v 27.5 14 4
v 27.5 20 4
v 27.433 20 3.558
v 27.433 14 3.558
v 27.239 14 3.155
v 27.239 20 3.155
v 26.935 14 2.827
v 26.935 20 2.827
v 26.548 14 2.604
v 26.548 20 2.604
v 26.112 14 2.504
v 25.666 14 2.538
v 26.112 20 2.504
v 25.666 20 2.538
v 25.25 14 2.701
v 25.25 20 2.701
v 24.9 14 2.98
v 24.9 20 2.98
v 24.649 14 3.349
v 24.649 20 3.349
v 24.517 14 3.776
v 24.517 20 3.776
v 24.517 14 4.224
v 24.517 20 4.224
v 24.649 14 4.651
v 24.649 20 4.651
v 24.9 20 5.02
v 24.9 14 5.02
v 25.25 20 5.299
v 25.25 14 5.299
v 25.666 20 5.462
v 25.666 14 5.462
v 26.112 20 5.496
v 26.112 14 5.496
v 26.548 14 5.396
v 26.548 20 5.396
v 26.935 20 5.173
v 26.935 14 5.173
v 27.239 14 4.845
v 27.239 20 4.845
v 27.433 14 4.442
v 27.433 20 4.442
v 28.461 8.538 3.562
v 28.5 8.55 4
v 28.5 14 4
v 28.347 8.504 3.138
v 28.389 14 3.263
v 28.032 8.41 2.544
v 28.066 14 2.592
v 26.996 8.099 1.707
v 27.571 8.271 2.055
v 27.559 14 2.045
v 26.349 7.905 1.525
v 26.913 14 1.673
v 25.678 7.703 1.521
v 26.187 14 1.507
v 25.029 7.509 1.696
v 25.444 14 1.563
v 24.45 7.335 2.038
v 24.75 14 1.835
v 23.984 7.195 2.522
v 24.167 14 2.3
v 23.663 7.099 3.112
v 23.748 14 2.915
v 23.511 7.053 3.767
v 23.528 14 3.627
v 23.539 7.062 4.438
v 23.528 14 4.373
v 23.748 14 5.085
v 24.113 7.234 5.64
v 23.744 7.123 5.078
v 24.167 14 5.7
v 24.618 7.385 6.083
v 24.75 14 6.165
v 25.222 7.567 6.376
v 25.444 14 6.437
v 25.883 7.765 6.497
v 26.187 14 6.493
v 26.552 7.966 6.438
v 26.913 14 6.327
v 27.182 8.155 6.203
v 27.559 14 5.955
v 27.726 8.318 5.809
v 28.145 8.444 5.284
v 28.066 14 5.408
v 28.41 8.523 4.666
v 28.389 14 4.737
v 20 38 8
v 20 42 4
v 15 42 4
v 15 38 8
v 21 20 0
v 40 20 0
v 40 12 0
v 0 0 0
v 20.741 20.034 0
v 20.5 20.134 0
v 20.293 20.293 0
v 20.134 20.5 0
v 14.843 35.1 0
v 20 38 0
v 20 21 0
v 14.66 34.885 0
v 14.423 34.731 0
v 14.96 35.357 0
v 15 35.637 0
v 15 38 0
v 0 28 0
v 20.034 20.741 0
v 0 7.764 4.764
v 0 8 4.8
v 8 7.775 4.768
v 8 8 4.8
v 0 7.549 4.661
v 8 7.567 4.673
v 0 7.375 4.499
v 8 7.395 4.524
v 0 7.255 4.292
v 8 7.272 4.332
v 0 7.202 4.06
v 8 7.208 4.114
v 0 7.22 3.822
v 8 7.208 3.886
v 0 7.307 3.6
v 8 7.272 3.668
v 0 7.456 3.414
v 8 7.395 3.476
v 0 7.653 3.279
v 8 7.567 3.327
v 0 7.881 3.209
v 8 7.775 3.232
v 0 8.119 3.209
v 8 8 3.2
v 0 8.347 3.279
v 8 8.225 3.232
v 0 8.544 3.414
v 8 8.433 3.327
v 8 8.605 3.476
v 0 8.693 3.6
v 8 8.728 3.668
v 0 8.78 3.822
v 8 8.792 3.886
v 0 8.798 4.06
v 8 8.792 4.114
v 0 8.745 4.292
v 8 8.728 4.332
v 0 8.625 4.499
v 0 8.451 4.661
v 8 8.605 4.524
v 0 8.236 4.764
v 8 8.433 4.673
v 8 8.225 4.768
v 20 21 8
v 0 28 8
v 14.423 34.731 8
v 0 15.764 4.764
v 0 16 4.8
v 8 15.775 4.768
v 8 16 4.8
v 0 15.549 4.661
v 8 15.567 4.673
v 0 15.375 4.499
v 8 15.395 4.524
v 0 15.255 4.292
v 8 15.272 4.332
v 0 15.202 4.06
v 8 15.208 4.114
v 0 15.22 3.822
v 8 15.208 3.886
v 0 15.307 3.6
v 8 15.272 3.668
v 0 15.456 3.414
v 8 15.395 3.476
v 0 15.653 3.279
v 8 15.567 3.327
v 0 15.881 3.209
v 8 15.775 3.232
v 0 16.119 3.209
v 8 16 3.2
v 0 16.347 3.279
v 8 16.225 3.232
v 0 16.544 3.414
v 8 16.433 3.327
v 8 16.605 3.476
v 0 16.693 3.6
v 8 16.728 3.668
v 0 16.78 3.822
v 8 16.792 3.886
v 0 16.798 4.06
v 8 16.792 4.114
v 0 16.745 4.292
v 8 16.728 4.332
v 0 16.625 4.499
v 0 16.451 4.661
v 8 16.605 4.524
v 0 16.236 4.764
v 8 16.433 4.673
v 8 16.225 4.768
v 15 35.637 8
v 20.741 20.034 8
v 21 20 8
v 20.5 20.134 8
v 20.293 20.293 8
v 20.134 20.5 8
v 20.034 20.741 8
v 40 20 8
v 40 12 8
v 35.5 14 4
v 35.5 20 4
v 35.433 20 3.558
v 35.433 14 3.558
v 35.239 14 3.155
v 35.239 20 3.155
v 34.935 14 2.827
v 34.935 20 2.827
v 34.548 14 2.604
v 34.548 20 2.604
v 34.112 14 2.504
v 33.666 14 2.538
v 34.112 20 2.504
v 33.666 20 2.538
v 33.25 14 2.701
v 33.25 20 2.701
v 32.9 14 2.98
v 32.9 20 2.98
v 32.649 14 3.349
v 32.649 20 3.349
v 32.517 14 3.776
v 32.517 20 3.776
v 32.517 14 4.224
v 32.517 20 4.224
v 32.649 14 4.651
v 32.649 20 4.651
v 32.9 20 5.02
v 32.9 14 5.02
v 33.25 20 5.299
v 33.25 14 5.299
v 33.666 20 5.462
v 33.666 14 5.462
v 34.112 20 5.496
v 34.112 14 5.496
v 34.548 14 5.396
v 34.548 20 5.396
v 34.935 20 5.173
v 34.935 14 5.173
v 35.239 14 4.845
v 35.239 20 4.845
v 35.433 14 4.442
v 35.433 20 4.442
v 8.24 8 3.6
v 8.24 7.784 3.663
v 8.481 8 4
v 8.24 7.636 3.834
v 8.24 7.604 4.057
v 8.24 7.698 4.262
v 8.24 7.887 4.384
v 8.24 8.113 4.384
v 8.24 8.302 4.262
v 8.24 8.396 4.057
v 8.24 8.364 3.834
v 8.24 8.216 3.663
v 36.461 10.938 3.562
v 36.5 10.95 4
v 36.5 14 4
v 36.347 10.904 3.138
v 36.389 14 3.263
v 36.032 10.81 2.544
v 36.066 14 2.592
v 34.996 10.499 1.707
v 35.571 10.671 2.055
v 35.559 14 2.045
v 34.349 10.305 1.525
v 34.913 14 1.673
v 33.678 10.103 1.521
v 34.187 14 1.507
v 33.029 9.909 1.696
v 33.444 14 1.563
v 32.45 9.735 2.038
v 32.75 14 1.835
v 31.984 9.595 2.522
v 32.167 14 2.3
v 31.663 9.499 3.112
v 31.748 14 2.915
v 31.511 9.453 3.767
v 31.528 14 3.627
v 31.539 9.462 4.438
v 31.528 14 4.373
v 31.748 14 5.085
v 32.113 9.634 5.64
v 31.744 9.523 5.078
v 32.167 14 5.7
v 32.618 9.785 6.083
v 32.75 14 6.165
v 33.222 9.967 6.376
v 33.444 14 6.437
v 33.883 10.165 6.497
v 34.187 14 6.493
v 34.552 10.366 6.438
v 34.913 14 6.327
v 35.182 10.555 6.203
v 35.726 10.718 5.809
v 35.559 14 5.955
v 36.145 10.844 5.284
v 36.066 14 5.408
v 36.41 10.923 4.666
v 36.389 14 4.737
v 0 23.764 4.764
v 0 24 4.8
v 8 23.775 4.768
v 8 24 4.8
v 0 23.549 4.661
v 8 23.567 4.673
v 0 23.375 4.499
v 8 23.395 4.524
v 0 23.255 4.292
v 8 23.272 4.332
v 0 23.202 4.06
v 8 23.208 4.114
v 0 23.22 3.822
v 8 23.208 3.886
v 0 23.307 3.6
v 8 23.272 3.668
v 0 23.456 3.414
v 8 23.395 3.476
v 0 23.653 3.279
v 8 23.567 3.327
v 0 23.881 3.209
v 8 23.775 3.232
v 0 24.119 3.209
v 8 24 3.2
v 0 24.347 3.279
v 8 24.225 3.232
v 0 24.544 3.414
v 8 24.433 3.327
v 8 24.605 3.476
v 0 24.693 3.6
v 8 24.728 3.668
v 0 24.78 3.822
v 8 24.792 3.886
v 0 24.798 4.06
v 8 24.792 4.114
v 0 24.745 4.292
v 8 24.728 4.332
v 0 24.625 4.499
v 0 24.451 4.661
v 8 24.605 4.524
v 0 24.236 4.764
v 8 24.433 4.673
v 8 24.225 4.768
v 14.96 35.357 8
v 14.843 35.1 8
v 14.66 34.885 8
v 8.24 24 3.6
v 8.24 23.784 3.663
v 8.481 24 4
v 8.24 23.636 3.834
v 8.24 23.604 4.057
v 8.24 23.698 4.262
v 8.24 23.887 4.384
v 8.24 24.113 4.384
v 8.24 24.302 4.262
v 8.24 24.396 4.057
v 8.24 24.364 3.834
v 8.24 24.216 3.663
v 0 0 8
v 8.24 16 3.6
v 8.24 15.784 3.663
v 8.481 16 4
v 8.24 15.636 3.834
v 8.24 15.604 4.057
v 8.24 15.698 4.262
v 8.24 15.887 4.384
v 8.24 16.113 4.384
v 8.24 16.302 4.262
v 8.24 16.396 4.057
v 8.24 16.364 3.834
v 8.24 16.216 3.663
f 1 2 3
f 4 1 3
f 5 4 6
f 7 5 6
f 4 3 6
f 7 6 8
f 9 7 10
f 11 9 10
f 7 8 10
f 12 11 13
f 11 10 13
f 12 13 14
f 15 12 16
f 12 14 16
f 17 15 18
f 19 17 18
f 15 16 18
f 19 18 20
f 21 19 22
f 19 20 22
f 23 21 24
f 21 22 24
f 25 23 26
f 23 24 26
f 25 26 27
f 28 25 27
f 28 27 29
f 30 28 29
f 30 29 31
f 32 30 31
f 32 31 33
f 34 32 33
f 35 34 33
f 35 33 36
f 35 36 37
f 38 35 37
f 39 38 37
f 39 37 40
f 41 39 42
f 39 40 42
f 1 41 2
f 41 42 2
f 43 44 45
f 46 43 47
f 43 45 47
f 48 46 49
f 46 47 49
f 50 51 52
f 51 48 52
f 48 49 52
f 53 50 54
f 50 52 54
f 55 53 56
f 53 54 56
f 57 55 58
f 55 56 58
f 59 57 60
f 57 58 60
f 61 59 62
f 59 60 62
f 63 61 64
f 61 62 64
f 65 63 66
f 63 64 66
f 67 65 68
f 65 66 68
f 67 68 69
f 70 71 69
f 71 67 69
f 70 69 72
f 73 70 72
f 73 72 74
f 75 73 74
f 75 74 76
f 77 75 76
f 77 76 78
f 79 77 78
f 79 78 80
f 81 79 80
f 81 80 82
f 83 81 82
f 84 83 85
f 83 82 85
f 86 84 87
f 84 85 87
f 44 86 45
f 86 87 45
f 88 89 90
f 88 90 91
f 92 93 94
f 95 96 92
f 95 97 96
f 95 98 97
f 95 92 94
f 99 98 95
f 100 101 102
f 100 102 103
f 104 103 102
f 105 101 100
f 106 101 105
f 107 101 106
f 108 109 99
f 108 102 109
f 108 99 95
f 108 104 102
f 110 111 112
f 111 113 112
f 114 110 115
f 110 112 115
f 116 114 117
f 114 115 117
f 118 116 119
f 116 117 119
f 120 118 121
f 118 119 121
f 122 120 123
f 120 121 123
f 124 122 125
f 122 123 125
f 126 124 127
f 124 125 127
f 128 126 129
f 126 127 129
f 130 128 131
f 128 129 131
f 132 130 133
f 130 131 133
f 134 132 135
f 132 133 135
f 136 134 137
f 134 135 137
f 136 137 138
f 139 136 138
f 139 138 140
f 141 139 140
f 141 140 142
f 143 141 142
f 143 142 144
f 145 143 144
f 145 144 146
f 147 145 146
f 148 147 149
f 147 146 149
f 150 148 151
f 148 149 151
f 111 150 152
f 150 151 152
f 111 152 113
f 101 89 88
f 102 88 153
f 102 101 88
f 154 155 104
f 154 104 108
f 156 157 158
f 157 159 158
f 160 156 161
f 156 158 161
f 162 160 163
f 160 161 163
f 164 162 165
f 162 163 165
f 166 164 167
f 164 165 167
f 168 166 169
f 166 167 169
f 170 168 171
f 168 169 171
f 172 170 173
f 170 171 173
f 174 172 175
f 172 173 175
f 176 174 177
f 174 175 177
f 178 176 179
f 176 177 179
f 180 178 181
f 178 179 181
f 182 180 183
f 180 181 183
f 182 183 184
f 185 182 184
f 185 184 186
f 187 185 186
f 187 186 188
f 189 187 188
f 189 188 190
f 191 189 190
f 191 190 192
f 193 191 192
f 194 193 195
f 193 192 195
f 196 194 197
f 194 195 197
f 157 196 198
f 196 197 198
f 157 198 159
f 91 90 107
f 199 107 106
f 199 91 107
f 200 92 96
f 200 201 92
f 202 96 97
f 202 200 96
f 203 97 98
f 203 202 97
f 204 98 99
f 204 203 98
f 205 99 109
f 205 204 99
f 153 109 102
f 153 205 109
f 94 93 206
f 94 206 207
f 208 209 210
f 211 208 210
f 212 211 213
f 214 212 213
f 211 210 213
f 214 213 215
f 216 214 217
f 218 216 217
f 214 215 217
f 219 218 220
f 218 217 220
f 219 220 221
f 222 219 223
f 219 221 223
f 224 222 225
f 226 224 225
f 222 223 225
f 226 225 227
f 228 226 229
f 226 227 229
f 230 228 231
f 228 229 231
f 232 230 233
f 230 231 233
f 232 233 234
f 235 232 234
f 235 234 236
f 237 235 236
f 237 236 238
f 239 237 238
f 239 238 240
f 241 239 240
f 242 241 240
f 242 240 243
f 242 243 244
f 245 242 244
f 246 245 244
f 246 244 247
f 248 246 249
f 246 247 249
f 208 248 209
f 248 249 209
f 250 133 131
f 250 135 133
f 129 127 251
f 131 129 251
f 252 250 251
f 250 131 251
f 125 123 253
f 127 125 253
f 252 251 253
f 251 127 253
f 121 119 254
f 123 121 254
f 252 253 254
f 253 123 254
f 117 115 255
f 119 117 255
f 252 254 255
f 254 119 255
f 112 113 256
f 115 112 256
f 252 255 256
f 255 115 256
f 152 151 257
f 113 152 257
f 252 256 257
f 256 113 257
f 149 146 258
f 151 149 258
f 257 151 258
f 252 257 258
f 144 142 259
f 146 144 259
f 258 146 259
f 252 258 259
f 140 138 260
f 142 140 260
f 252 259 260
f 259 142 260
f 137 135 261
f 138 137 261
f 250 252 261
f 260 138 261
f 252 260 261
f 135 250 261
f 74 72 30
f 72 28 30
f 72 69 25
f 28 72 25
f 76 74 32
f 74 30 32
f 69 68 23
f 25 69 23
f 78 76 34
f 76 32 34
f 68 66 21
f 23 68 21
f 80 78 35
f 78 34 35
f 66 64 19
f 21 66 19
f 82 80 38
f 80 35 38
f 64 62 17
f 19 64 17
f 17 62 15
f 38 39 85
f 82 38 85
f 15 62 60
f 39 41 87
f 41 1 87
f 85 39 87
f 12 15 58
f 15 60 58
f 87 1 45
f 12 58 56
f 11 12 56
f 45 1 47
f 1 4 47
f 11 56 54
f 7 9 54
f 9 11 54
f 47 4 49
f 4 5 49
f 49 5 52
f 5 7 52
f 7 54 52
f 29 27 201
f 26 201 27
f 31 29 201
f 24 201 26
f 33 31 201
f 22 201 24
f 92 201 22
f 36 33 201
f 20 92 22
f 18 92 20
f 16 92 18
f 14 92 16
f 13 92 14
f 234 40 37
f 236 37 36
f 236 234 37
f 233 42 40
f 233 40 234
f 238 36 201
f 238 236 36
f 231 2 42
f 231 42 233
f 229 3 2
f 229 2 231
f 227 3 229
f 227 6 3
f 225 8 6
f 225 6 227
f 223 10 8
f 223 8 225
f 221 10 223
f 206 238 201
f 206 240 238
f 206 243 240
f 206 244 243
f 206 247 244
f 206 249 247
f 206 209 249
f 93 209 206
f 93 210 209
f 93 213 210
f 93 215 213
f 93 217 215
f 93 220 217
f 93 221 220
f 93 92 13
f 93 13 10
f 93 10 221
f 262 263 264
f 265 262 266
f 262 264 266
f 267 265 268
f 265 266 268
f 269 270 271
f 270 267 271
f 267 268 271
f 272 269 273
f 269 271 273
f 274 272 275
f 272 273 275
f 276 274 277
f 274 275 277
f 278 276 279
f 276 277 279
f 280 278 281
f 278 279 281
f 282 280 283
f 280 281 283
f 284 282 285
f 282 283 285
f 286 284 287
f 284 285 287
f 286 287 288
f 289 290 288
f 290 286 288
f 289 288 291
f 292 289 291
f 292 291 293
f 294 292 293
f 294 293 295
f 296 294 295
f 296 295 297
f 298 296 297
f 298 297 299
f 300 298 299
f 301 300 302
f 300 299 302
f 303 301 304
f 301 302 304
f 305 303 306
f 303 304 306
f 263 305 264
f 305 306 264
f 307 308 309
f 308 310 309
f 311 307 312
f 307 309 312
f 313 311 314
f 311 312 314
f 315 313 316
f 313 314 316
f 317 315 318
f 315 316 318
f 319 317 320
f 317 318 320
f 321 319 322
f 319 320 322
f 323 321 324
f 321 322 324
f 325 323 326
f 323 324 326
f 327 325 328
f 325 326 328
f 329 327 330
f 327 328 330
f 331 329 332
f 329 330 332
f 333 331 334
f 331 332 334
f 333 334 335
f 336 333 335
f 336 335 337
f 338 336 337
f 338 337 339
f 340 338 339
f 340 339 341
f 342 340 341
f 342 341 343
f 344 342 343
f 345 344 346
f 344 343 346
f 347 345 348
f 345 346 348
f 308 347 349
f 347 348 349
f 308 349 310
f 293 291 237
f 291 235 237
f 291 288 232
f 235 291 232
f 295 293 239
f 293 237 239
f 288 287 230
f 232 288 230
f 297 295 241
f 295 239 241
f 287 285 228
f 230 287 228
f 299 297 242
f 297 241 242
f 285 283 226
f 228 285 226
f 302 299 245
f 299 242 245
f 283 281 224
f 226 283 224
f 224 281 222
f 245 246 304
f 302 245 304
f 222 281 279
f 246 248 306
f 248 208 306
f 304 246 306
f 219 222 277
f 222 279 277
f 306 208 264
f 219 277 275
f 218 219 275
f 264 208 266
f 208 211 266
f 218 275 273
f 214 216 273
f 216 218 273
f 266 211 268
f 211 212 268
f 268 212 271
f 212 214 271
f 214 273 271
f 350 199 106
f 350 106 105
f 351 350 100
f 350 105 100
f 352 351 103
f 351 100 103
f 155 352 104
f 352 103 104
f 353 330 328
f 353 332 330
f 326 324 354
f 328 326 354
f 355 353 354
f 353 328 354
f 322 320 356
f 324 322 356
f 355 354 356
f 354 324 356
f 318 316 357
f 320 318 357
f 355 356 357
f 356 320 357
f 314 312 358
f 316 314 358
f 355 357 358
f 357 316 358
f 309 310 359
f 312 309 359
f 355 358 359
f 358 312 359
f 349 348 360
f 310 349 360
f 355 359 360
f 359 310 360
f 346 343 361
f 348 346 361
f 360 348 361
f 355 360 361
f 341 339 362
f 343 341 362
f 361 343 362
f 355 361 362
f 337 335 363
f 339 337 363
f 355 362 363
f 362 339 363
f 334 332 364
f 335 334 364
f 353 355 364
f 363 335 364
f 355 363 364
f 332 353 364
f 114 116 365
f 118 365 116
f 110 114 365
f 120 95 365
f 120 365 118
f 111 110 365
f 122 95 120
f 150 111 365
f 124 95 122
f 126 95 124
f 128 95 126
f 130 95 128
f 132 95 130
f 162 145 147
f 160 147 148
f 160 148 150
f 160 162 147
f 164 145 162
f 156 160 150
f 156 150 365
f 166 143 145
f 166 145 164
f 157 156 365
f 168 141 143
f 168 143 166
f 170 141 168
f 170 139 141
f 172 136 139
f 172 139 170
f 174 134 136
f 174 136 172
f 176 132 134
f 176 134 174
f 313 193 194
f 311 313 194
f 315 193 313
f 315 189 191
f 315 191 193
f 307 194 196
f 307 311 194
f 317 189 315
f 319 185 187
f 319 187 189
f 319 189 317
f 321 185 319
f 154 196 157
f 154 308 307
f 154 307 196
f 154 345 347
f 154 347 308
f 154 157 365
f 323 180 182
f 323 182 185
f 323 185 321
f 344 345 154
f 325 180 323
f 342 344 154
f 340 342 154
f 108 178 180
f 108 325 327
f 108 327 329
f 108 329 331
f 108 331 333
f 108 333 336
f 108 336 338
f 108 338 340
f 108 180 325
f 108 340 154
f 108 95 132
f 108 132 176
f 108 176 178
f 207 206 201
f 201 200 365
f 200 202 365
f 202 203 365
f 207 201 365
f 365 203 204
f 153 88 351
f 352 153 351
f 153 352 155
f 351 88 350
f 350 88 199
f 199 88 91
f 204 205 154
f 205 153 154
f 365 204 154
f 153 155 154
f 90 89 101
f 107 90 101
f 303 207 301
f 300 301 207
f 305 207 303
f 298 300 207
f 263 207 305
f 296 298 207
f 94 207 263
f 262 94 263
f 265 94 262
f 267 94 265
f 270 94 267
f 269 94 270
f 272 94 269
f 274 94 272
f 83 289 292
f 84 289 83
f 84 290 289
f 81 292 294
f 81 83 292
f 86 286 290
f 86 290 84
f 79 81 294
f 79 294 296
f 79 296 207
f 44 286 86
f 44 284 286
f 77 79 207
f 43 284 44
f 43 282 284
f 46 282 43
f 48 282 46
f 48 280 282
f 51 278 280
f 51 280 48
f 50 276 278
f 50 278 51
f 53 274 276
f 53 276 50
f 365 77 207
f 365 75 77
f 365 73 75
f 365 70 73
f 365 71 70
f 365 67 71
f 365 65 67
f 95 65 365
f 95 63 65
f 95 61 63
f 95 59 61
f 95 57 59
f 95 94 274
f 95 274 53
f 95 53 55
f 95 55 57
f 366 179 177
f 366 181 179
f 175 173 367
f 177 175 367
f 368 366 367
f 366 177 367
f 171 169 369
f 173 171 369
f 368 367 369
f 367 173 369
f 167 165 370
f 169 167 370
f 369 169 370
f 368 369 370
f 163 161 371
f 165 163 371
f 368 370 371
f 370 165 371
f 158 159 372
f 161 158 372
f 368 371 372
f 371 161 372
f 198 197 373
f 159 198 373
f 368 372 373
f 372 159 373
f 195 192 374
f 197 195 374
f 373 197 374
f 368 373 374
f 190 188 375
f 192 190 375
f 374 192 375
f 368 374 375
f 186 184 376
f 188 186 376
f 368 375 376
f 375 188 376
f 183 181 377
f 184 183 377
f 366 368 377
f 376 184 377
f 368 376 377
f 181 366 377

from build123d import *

# Parameters (mm, degrees)
BOSS_EXTRUDE1_DEPTH       = 8
CUT_EXTRUDE1_DEPTH        = 8
SKETCH7_R                 = 1.5
CUT_EXTRUDE4_DEPTH        = 6
SKETCH9_R                 = 2.5
CUT_EXTRUDE5_DEPTH        = 15
CUT_EXTRUDE2_DEPTH        = 21
CUT_EXTRUDE3_DEPTH        = 21
M2X0_4_TAPPED_HOLE1_D     = 1.6
M2X0_4_TAPPED_HOLE1_DEPTH = 8
M2X0_4_TAPPED_HOLE1_TIP   = 0.480688495
FILLET1_R                 = 1
FILLET2_R                 = 1


with BuildPart() as part:
    # Sketch1 → Boss-Extrude1 (new body)
    with BuildSketch(Plane.XY):
        Polygon((0, 0), (0, 42), (20, 42), (20, 20), (40, 20), (40, 12), align=None)
    extrude(amount=BOSS_EXTRUDE1_DEPTH)

    # Sketch2 → Cut-Extrude1 (cut)
    with BuildSketch(Plane.XY.offset(8)):
        Polygon((15, 42), (15, 35), (0, 28), (0, 42), align=None)
    extrude(amount=-CUT_EXTRUDE1_DEPTH, mode=Mode.SUBTRACT)

    # Sketch7 → Cut-Extrude4 (cut)
    with BuildSketch(Plane(origin=(0, 20, 0), x_dir=(1, 0, 0), z_dir=(0, 1, 0))):
        with Locations((34, -4)):
            Circle(SKETCH7_R)
        with Locations((26, -4)):
            Circle(SKETCH7_R)
    extrude(amount=-CUT_EXTRUDE4_DEPTH, mode=Mode.SUBTRACT)

    # Sketch9 → Cut-Extrude5 (cut, through all)
    with BuildSketch(Plane(origin=(0, 14, 0), x_dir=(1, 0, 0), z_dir=(0, 1, 0))):
        with Locations((34, -4)):
            Circle(SKETCH9_R)
        with Locations((26, -4)):
            Circle(SKETCH9_R)
    extrude(amount=-CUT_EXTRUDE5_DEPTH, mode=Mode.SUBTRACT)

    # Sketch5 → Cut-Extrude2 (cut, through all)
    with BuildSketch(Plane(origin=(20, 0, 0), x_dir=(0, 0, -1), z_dir=(1, 0, 0))):
        Polygon((-8, 42), (-4, 42), (-8, 38), align=None)
    extrude(amount=-CUT_EXTRUDE2_DEPTH, mode=Mode.SUBTRACT)

    # Sketch6 → Cut-Extrude3 (cut, through all)
    with BuildSketch(Plane(origin=(20, 0, 0), x_dir=(0, 0, -1), z_dir=(1, 0, 0))):
        Polygon((0, 42), (-4, 42), (0, 38), align=None)
    extrude(amount=-CUT_EXTRUDE3_DEPTH, mode=Mode.SUBTRACT)

    # M2x0.4 Tapped Hole1
    with Locations(Plane(origin=(0, 24, 4), x_dir=(0, 0, -1), z_dir=(-1, 0, 0))):
        with Locations((0, 0), (0, 8), (0, 16)):
            Hole(M2X0_4_TAPPED_HOLE1_D / 2, depth=M2X0_4_TAPPED_HOLE1_DEPTH)
            with Locations((0, 0, -(M2X0_4_TAPPED_HOLE1_DEPTH + M2X0_4_TAPPED_HOLE1_TIP / 2))):  # 118° drill point
                Cone(0, M2X0_4_TAPPED_HOLE1_D / 2, M2X0_4_TAPPED_HOLE1_TIP, mode=Mode.SUBTRACT)

    # Fillet1
    fillet1_edges = [part.edges().sort_by_distance(p)[0] for p in [
        (20, 20, 4),
    ]]
    fillet(fillet1_edges, radius=FILLET1_R)

    # Fillet2
    fillet2_edges = [part.edges().sort_by_distance(p)[0] for p in [
        (15, 35, 4),
    ]]
    fillet(fillet2_edges, radius=FILLET2_R)


solid = part.part
